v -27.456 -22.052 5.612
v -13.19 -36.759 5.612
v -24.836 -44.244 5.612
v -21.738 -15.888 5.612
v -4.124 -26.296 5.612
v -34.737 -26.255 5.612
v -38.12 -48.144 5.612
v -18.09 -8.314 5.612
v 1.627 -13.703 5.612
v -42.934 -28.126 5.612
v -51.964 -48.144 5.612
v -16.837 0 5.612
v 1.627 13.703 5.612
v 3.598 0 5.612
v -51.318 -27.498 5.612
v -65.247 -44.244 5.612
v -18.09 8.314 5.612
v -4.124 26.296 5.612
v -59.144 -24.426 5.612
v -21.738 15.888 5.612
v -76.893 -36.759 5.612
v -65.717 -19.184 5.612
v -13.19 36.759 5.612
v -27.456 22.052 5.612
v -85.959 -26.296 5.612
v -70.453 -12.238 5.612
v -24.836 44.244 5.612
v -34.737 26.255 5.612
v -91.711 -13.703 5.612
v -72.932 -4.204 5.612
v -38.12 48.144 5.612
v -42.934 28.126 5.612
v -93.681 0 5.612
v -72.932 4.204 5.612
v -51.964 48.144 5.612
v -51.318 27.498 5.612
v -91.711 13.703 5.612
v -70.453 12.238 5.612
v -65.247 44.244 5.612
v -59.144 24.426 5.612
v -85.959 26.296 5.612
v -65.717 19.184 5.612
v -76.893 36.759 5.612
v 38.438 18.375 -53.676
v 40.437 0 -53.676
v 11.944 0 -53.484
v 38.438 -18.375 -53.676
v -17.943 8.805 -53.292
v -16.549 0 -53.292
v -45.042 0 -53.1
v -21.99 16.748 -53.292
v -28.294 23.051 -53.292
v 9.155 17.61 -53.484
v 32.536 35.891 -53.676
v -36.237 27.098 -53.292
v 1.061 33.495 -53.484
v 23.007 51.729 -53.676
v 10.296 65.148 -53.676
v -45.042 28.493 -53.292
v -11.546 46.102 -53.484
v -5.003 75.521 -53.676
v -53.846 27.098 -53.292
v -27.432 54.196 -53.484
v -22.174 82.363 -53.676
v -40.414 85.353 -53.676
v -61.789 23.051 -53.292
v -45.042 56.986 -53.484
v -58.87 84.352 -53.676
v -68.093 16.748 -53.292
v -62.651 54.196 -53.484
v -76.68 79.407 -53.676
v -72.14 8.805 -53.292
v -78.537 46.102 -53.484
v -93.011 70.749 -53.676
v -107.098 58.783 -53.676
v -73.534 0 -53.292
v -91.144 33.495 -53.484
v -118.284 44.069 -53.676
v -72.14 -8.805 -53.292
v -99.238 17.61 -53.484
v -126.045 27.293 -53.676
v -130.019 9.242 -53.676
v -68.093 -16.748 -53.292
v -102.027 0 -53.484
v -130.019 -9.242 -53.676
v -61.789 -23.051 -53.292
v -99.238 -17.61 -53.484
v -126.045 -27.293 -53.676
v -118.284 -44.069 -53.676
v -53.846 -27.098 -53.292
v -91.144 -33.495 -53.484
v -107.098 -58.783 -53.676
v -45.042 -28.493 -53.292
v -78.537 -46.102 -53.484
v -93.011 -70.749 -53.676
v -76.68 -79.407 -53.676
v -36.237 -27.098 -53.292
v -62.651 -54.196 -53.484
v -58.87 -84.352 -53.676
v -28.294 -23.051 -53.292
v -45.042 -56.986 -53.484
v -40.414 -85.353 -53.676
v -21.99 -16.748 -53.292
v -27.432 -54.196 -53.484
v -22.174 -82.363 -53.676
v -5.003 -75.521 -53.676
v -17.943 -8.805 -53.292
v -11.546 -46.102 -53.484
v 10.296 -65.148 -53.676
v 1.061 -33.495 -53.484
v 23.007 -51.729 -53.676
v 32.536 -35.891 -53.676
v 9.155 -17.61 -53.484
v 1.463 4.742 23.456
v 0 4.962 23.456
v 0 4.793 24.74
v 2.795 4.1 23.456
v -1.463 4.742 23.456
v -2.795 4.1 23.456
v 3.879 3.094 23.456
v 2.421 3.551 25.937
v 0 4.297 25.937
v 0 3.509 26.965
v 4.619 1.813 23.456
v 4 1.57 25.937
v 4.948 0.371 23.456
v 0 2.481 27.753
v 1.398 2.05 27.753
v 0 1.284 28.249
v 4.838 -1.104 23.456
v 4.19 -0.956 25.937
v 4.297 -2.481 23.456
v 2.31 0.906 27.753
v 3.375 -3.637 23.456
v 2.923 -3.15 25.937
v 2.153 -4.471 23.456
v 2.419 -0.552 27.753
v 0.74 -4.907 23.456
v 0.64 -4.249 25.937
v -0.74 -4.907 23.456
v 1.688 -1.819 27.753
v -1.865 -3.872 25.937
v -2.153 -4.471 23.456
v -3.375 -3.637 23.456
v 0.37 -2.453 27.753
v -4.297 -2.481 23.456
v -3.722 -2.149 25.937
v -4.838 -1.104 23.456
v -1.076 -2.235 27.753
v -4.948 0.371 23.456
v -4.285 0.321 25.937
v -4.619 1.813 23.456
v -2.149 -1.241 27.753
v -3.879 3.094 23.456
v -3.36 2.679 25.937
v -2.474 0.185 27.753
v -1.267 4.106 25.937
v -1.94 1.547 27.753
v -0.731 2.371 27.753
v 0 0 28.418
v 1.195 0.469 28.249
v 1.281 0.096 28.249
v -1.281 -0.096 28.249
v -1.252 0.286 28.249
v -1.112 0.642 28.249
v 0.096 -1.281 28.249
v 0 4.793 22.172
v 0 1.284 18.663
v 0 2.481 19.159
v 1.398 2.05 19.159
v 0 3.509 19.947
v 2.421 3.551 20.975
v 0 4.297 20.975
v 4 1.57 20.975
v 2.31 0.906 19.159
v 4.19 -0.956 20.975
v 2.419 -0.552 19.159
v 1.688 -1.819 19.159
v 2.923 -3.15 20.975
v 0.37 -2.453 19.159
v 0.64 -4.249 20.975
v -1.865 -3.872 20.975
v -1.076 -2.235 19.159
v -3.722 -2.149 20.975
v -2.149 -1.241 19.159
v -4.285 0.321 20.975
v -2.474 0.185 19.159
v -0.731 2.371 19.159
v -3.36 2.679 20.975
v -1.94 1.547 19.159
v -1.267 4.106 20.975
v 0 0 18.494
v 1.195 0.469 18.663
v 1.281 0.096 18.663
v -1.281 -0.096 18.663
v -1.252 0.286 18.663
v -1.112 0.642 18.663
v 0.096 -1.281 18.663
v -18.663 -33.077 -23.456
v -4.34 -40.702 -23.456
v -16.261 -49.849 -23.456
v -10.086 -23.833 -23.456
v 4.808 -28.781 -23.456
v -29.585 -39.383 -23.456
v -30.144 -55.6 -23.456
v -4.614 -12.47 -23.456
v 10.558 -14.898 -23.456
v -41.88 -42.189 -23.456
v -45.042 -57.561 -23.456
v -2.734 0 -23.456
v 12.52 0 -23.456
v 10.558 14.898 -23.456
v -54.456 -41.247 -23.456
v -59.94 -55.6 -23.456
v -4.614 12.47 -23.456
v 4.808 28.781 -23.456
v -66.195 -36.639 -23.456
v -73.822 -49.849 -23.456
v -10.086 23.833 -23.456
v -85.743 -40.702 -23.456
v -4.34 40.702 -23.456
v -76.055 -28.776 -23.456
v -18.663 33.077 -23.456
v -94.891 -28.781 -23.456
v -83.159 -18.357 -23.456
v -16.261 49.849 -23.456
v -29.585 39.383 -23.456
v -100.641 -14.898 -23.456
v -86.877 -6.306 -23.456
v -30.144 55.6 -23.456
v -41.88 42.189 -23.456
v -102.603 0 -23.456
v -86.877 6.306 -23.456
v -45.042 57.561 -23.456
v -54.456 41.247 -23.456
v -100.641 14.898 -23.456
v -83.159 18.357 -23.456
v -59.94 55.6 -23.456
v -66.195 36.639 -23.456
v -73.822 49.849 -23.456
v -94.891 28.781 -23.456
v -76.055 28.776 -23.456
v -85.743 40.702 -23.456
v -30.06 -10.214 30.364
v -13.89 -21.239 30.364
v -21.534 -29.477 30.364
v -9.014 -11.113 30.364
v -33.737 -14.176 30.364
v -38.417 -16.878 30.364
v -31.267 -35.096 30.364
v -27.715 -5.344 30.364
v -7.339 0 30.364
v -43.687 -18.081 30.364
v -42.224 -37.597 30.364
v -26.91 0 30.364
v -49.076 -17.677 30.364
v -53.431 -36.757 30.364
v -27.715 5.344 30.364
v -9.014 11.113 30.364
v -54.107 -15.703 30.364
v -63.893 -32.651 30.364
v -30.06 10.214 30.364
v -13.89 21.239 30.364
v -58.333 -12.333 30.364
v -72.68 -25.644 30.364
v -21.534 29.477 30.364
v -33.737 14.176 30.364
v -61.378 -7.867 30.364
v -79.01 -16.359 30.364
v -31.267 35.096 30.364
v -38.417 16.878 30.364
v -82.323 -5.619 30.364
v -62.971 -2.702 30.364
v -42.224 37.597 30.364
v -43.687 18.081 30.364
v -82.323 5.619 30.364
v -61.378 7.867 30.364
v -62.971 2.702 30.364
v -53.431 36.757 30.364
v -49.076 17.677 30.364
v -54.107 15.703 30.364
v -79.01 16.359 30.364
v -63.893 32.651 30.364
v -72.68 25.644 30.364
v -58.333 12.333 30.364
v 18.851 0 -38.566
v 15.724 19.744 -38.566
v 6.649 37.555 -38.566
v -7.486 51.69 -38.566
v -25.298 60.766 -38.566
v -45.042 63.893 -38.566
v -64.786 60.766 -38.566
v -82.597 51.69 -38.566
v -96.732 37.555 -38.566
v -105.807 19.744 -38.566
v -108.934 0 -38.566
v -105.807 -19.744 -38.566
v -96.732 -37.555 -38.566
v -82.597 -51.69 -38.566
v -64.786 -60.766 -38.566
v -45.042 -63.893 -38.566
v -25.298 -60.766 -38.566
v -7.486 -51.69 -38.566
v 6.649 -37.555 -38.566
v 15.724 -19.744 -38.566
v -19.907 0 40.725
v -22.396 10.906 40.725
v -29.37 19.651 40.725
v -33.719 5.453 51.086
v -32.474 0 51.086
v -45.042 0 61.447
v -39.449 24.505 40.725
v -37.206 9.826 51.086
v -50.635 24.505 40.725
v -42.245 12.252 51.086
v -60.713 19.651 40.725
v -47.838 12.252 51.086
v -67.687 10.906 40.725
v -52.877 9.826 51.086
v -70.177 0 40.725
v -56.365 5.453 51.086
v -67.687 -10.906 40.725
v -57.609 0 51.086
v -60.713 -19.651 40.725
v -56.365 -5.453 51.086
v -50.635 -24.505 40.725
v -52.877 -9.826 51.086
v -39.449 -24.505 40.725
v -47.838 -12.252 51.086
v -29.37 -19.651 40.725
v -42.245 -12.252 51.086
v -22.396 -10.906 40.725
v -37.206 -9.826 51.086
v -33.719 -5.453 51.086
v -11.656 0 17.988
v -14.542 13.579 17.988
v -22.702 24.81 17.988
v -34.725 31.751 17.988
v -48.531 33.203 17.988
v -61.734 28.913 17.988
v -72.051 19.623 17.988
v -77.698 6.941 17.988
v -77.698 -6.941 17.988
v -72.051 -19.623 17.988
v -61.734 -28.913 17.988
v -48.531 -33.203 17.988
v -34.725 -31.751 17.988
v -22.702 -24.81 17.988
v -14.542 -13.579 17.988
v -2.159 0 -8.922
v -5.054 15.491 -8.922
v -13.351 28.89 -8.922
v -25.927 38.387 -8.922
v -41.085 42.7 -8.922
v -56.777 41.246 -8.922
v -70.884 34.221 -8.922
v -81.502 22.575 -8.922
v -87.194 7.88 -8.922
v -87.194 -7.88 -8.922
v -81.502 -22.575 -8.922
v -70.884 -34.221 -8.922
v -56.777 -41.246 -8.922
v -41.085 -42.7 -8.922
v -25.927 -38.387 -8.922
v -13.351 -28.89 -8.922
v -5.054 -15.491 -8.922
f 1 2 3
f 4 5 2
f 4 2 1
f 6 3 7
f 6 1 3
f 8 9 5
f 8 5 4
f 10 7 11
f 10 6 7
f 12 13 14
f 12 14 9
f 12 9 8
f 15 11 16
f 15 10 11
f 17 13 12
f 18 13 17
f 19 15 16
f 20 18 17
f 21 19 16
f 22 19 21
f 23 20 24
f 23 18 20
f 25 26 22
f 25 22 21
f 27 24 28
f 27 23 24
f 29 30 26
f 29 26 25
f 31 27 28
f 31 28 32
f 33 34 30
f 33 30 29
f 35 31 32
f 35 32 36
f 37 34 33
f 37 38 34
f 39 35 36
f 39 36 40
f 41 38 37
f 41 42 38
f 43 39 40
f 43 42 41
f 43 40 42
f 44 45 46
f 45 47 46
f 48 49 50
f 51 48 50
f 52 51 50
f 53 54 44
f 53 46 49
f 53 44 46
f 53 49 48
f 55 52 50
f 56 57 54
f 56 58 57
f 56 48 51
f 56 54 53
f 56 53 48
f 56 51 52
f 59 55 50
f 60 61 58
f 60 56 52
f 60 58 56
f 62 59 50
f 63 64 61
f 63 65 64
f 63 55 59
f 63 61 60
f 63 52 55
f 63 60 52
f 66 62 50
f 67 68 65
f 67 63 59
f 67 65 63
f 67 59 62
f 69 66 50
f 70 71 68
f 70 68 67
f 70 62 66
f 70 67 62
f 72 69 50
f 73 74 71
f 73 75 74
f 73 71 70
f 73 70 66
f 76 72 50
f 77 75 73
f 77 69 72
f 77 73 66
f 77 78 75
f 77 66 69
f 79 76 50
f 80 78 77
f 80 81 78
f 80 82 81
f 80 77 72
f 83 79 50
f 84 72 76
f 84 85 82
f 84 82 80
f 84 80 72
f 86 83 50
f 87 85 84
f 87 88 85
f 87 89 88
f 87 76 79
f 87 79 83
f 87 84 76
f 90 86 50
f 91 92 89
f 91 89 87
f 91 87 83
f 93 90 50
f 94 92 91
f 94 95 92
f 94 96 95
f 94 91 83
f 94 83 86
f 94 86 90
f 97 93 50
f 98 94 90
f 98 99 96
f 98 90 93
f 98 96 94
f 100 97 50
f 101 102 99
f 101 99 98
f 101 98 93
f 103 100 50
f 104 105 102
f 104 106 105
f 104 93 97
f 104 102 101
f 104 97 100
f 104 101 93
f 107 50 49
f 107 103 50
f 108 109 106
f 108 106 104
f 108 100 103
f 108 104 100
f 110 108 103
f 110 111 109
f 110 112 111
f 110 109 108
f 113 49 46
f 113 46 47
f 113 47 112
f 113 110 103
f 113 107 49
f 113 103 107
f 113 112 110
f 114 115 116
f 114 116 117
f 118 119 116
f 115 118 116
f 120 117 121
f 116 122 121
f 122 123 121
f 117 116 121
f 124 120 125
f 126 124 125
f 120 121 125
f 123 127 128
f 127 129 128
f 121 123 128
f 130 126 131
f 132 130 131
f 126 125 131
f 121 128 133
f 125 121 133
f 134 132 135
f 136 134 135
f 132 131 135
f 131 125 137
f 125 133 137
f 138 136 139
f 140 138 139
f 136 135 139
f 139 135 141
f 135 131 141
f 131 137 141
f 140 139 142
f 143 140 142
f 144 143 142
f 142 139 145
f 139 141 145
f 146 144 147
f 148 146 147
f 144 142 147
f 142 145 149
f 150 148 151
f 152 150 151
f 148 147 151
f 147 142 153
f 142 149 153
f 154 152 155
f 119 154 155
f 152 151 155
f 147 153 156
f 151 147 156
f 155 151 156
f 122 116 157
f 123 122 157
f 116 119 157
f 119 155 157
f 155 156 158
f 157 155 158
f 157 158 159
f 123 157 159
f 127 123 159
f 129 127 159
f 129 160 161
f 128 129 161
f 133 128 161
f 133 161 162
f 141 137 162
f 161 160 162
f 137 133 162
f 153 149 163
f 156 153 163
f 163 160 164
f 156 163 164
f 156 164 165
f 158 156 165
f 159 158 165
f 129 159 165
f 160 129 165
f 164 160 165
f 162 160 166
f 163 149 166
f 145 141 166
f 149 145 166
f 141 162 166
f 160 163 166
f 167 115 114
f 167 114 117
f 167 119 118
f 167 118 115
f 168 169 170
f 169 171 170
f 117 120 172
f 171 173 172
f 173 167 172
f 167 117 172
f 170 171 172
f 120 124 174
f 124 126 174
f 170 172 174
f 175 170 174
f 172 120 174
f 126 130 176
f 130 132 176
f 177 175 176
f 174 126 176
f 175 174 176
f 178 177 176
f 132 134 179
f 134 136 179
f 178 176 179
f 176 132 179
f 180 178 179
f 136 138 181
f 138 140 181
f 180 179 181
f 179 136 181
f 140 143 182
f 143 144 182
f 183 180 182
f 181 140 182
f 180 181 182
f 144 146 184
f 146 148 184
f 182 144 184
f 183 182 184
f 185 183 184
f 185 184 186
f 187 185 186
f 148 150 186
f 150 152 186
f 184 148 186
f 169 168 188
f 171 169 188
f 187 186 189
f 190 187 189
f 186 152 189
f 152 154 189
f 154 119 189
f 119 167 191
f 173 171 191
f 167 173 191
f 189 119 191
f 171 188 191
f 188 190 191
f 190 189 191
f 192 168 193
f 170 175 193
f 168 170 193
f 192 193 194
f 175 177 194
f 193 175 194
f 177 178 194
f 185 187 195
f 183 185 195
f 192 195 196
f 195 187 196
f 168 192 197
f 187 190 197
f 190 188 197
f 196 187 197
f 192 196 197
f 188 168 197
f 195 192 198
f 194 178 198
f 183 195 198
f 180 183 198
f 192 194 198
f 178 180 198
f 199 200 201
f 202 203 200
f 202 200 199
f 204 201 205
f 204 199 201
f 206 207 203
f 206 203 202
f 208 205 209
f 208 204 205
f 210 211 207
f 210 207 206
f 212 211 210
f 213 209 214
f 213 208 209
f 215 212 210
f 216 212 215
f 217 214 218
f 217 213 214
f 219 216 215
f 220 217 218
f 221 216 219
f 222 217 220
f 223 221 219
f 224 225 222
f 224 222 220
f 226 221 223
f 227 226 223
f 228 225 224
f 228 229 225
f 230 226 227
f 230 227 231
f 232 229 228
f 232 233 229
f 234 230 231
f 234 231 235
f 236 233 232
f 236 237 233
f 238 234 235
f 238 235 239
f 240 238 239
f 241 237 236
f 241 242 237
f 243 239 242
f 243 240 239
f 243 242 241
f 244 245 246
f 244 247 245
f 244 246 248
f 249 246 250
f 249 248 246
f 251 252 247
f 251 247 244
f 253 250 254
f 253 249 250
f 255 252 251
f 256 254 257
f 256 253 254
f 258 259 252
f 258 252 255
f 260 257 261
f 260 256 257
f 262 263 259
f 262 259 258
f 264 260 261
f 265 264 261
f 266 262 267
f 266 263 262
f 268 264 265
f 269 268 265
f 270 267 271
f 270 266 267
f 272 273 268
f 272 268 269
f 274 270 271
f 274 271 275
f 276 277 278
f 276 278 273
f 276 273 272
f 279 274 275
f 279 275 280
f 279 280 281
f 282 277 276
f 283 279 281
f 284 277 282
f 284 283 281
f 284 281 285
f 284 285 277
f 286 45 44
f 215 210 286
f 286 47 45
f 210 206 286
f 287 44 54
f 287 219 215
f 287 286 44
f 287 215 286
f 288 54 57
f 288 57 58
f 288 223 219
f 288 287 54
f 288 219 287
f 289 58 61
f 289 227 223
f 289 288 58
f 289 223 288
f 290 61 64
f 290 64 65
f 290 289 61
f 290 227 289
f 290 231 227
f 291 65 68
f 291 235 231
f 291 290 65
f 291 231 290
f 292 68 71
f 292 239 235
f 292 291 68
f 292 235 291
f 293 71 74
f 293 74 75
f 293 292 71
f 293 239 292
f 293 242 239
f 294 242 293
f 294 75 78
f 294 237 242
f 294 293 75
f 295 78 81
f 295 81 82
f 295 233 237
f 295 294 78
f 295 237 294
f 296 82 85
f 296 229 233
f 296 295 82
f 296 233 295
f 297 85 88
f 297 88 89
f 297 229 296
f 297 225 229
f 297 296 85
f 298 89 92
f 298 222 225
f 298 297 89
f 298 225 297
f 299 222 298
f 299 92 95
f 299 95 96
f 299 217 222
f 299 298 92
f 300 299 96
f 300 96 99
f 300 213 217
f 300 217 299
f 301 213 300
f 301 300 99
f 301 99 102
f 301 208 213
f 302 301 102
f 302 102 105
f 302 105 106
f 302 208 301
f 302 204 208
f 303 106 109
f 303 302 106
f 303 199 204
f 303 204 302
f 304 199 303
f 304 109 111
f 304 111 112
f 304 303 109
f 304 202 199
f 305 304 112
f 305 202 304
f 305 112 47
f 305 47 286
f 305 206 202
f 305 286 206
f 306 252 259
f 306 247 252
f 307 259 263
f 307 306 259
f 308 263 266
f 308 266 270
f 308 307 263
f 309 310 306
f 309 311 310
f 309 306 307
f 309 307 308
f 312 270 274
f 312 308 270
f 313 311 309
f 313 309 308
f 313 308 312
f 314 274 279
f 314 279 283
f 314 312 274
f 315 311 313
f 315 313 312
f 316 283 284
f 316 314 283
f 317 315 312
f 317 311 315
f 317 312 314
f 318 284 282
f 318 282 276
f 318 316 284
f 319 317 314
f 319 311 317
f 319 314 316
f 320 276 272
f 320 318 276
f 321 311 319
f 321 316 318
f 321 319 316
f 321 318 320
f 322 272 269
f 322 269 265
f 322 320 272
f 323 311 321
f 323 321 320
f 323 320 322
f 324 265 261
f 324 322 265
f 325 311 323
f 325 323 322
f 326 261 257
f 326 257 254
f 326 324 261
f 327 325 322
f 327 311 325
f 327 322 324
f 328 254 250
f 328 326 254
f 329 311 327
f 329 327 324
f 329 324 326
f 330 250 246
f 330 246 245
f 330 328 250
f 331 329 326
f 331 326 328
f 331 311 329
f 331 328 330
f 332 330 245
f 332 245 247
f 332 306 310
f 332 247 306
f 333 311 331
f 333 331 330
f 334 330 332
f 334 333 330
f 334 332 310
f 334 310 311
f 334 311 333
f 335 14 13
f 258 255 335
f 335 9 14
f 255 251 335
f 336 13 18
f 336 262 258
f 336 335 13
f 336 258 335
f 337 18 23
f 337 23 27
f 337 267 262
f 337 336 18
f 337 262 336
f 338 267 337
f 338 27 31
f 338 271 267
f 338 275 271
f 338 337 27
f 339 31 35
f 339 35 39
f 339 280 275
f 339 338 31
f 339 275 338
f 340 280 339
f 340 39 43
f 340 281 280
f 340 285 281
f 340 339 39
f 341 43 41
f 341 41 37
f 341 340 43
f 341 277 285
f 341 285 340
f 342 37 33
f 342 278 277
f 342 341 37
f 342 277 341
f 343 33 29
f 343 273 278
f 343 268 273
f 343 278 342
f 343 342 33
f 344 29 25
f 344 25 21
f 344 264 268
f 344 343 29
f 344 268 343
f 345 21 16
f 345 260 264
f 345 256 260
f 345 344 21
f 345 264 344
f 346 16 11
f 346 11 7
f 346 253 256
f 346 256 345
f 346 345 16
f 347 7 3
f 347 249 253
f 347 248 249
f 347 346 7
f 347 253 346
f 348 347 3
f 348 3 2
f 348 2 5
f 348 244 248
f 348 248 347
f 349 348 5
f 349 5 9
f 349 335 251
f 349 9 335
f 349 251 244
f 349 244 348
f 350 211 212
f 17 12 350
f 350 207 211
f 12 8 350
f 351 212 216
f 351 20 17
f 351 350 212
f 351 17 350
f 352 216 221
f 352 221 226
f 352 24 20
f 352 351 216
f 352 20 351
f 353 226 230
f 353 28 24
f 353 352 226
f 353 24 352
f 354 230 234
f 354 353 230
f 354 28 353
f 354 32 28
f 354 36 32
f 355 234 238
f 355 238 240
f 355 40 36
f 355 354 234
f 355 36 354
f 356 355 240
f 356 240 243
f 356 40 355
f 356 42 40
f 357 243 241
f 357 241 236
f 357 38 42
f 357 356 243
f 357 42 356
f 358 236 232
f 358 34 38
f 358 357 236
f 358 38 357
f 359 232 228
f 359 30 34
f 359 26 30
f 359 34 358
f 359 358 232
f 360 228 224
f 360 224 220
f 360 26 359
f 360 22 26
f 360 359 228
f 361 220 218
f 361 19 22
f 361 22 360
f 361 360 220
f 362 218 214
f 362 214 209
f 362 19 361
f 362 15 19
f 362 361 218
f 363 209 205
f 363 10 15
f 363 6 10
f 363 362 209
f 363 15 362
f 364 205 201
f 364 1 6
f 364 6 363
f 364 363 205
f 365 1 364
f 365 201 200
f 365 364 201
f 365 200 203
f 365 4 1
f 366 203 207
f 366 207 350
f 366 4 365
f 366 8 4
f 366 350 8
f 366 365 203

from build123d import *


with BuildPart() as f1:
    # F0 (on Front) → F1 (revolve)
    with BuildSketch(Plane.XZ):
        Polygon((-45.041602, 61.446529), (-45.041602, -53.100161), (40.436711, -53.675774), (-2.734155, -23.456169), (12.51955, -23.456169), (-16.836638, 5.612212), (3.597573, 5.612212), (-26.909839, 30.363508), (-7.339048, 30.363508), align=None)
    revolve(axis=Axis((-45.041602, 0, 4.173184), (0, 0, 1)))


with BuildPart() as f3:
    # F2 (on Right) → F3 (revolve)
    with BuildSketch(Plane.YZ):
        with BuildLine():
            ThreePointArc((0, 18.494128), (3.508693, 19.947476), (4.962042, 23.456169))
            ThreePointArc((4.962042, 23.456169), (3.508693, 26.964863), (0, 28.418211))
            Line((0, 28.418211), (0, 18.494128))
        make_face()
    revolve(axis=Axis((0, 0, 23.456169), (0, 0, -1)))


solid = Compound([f1.part, f3.part])
